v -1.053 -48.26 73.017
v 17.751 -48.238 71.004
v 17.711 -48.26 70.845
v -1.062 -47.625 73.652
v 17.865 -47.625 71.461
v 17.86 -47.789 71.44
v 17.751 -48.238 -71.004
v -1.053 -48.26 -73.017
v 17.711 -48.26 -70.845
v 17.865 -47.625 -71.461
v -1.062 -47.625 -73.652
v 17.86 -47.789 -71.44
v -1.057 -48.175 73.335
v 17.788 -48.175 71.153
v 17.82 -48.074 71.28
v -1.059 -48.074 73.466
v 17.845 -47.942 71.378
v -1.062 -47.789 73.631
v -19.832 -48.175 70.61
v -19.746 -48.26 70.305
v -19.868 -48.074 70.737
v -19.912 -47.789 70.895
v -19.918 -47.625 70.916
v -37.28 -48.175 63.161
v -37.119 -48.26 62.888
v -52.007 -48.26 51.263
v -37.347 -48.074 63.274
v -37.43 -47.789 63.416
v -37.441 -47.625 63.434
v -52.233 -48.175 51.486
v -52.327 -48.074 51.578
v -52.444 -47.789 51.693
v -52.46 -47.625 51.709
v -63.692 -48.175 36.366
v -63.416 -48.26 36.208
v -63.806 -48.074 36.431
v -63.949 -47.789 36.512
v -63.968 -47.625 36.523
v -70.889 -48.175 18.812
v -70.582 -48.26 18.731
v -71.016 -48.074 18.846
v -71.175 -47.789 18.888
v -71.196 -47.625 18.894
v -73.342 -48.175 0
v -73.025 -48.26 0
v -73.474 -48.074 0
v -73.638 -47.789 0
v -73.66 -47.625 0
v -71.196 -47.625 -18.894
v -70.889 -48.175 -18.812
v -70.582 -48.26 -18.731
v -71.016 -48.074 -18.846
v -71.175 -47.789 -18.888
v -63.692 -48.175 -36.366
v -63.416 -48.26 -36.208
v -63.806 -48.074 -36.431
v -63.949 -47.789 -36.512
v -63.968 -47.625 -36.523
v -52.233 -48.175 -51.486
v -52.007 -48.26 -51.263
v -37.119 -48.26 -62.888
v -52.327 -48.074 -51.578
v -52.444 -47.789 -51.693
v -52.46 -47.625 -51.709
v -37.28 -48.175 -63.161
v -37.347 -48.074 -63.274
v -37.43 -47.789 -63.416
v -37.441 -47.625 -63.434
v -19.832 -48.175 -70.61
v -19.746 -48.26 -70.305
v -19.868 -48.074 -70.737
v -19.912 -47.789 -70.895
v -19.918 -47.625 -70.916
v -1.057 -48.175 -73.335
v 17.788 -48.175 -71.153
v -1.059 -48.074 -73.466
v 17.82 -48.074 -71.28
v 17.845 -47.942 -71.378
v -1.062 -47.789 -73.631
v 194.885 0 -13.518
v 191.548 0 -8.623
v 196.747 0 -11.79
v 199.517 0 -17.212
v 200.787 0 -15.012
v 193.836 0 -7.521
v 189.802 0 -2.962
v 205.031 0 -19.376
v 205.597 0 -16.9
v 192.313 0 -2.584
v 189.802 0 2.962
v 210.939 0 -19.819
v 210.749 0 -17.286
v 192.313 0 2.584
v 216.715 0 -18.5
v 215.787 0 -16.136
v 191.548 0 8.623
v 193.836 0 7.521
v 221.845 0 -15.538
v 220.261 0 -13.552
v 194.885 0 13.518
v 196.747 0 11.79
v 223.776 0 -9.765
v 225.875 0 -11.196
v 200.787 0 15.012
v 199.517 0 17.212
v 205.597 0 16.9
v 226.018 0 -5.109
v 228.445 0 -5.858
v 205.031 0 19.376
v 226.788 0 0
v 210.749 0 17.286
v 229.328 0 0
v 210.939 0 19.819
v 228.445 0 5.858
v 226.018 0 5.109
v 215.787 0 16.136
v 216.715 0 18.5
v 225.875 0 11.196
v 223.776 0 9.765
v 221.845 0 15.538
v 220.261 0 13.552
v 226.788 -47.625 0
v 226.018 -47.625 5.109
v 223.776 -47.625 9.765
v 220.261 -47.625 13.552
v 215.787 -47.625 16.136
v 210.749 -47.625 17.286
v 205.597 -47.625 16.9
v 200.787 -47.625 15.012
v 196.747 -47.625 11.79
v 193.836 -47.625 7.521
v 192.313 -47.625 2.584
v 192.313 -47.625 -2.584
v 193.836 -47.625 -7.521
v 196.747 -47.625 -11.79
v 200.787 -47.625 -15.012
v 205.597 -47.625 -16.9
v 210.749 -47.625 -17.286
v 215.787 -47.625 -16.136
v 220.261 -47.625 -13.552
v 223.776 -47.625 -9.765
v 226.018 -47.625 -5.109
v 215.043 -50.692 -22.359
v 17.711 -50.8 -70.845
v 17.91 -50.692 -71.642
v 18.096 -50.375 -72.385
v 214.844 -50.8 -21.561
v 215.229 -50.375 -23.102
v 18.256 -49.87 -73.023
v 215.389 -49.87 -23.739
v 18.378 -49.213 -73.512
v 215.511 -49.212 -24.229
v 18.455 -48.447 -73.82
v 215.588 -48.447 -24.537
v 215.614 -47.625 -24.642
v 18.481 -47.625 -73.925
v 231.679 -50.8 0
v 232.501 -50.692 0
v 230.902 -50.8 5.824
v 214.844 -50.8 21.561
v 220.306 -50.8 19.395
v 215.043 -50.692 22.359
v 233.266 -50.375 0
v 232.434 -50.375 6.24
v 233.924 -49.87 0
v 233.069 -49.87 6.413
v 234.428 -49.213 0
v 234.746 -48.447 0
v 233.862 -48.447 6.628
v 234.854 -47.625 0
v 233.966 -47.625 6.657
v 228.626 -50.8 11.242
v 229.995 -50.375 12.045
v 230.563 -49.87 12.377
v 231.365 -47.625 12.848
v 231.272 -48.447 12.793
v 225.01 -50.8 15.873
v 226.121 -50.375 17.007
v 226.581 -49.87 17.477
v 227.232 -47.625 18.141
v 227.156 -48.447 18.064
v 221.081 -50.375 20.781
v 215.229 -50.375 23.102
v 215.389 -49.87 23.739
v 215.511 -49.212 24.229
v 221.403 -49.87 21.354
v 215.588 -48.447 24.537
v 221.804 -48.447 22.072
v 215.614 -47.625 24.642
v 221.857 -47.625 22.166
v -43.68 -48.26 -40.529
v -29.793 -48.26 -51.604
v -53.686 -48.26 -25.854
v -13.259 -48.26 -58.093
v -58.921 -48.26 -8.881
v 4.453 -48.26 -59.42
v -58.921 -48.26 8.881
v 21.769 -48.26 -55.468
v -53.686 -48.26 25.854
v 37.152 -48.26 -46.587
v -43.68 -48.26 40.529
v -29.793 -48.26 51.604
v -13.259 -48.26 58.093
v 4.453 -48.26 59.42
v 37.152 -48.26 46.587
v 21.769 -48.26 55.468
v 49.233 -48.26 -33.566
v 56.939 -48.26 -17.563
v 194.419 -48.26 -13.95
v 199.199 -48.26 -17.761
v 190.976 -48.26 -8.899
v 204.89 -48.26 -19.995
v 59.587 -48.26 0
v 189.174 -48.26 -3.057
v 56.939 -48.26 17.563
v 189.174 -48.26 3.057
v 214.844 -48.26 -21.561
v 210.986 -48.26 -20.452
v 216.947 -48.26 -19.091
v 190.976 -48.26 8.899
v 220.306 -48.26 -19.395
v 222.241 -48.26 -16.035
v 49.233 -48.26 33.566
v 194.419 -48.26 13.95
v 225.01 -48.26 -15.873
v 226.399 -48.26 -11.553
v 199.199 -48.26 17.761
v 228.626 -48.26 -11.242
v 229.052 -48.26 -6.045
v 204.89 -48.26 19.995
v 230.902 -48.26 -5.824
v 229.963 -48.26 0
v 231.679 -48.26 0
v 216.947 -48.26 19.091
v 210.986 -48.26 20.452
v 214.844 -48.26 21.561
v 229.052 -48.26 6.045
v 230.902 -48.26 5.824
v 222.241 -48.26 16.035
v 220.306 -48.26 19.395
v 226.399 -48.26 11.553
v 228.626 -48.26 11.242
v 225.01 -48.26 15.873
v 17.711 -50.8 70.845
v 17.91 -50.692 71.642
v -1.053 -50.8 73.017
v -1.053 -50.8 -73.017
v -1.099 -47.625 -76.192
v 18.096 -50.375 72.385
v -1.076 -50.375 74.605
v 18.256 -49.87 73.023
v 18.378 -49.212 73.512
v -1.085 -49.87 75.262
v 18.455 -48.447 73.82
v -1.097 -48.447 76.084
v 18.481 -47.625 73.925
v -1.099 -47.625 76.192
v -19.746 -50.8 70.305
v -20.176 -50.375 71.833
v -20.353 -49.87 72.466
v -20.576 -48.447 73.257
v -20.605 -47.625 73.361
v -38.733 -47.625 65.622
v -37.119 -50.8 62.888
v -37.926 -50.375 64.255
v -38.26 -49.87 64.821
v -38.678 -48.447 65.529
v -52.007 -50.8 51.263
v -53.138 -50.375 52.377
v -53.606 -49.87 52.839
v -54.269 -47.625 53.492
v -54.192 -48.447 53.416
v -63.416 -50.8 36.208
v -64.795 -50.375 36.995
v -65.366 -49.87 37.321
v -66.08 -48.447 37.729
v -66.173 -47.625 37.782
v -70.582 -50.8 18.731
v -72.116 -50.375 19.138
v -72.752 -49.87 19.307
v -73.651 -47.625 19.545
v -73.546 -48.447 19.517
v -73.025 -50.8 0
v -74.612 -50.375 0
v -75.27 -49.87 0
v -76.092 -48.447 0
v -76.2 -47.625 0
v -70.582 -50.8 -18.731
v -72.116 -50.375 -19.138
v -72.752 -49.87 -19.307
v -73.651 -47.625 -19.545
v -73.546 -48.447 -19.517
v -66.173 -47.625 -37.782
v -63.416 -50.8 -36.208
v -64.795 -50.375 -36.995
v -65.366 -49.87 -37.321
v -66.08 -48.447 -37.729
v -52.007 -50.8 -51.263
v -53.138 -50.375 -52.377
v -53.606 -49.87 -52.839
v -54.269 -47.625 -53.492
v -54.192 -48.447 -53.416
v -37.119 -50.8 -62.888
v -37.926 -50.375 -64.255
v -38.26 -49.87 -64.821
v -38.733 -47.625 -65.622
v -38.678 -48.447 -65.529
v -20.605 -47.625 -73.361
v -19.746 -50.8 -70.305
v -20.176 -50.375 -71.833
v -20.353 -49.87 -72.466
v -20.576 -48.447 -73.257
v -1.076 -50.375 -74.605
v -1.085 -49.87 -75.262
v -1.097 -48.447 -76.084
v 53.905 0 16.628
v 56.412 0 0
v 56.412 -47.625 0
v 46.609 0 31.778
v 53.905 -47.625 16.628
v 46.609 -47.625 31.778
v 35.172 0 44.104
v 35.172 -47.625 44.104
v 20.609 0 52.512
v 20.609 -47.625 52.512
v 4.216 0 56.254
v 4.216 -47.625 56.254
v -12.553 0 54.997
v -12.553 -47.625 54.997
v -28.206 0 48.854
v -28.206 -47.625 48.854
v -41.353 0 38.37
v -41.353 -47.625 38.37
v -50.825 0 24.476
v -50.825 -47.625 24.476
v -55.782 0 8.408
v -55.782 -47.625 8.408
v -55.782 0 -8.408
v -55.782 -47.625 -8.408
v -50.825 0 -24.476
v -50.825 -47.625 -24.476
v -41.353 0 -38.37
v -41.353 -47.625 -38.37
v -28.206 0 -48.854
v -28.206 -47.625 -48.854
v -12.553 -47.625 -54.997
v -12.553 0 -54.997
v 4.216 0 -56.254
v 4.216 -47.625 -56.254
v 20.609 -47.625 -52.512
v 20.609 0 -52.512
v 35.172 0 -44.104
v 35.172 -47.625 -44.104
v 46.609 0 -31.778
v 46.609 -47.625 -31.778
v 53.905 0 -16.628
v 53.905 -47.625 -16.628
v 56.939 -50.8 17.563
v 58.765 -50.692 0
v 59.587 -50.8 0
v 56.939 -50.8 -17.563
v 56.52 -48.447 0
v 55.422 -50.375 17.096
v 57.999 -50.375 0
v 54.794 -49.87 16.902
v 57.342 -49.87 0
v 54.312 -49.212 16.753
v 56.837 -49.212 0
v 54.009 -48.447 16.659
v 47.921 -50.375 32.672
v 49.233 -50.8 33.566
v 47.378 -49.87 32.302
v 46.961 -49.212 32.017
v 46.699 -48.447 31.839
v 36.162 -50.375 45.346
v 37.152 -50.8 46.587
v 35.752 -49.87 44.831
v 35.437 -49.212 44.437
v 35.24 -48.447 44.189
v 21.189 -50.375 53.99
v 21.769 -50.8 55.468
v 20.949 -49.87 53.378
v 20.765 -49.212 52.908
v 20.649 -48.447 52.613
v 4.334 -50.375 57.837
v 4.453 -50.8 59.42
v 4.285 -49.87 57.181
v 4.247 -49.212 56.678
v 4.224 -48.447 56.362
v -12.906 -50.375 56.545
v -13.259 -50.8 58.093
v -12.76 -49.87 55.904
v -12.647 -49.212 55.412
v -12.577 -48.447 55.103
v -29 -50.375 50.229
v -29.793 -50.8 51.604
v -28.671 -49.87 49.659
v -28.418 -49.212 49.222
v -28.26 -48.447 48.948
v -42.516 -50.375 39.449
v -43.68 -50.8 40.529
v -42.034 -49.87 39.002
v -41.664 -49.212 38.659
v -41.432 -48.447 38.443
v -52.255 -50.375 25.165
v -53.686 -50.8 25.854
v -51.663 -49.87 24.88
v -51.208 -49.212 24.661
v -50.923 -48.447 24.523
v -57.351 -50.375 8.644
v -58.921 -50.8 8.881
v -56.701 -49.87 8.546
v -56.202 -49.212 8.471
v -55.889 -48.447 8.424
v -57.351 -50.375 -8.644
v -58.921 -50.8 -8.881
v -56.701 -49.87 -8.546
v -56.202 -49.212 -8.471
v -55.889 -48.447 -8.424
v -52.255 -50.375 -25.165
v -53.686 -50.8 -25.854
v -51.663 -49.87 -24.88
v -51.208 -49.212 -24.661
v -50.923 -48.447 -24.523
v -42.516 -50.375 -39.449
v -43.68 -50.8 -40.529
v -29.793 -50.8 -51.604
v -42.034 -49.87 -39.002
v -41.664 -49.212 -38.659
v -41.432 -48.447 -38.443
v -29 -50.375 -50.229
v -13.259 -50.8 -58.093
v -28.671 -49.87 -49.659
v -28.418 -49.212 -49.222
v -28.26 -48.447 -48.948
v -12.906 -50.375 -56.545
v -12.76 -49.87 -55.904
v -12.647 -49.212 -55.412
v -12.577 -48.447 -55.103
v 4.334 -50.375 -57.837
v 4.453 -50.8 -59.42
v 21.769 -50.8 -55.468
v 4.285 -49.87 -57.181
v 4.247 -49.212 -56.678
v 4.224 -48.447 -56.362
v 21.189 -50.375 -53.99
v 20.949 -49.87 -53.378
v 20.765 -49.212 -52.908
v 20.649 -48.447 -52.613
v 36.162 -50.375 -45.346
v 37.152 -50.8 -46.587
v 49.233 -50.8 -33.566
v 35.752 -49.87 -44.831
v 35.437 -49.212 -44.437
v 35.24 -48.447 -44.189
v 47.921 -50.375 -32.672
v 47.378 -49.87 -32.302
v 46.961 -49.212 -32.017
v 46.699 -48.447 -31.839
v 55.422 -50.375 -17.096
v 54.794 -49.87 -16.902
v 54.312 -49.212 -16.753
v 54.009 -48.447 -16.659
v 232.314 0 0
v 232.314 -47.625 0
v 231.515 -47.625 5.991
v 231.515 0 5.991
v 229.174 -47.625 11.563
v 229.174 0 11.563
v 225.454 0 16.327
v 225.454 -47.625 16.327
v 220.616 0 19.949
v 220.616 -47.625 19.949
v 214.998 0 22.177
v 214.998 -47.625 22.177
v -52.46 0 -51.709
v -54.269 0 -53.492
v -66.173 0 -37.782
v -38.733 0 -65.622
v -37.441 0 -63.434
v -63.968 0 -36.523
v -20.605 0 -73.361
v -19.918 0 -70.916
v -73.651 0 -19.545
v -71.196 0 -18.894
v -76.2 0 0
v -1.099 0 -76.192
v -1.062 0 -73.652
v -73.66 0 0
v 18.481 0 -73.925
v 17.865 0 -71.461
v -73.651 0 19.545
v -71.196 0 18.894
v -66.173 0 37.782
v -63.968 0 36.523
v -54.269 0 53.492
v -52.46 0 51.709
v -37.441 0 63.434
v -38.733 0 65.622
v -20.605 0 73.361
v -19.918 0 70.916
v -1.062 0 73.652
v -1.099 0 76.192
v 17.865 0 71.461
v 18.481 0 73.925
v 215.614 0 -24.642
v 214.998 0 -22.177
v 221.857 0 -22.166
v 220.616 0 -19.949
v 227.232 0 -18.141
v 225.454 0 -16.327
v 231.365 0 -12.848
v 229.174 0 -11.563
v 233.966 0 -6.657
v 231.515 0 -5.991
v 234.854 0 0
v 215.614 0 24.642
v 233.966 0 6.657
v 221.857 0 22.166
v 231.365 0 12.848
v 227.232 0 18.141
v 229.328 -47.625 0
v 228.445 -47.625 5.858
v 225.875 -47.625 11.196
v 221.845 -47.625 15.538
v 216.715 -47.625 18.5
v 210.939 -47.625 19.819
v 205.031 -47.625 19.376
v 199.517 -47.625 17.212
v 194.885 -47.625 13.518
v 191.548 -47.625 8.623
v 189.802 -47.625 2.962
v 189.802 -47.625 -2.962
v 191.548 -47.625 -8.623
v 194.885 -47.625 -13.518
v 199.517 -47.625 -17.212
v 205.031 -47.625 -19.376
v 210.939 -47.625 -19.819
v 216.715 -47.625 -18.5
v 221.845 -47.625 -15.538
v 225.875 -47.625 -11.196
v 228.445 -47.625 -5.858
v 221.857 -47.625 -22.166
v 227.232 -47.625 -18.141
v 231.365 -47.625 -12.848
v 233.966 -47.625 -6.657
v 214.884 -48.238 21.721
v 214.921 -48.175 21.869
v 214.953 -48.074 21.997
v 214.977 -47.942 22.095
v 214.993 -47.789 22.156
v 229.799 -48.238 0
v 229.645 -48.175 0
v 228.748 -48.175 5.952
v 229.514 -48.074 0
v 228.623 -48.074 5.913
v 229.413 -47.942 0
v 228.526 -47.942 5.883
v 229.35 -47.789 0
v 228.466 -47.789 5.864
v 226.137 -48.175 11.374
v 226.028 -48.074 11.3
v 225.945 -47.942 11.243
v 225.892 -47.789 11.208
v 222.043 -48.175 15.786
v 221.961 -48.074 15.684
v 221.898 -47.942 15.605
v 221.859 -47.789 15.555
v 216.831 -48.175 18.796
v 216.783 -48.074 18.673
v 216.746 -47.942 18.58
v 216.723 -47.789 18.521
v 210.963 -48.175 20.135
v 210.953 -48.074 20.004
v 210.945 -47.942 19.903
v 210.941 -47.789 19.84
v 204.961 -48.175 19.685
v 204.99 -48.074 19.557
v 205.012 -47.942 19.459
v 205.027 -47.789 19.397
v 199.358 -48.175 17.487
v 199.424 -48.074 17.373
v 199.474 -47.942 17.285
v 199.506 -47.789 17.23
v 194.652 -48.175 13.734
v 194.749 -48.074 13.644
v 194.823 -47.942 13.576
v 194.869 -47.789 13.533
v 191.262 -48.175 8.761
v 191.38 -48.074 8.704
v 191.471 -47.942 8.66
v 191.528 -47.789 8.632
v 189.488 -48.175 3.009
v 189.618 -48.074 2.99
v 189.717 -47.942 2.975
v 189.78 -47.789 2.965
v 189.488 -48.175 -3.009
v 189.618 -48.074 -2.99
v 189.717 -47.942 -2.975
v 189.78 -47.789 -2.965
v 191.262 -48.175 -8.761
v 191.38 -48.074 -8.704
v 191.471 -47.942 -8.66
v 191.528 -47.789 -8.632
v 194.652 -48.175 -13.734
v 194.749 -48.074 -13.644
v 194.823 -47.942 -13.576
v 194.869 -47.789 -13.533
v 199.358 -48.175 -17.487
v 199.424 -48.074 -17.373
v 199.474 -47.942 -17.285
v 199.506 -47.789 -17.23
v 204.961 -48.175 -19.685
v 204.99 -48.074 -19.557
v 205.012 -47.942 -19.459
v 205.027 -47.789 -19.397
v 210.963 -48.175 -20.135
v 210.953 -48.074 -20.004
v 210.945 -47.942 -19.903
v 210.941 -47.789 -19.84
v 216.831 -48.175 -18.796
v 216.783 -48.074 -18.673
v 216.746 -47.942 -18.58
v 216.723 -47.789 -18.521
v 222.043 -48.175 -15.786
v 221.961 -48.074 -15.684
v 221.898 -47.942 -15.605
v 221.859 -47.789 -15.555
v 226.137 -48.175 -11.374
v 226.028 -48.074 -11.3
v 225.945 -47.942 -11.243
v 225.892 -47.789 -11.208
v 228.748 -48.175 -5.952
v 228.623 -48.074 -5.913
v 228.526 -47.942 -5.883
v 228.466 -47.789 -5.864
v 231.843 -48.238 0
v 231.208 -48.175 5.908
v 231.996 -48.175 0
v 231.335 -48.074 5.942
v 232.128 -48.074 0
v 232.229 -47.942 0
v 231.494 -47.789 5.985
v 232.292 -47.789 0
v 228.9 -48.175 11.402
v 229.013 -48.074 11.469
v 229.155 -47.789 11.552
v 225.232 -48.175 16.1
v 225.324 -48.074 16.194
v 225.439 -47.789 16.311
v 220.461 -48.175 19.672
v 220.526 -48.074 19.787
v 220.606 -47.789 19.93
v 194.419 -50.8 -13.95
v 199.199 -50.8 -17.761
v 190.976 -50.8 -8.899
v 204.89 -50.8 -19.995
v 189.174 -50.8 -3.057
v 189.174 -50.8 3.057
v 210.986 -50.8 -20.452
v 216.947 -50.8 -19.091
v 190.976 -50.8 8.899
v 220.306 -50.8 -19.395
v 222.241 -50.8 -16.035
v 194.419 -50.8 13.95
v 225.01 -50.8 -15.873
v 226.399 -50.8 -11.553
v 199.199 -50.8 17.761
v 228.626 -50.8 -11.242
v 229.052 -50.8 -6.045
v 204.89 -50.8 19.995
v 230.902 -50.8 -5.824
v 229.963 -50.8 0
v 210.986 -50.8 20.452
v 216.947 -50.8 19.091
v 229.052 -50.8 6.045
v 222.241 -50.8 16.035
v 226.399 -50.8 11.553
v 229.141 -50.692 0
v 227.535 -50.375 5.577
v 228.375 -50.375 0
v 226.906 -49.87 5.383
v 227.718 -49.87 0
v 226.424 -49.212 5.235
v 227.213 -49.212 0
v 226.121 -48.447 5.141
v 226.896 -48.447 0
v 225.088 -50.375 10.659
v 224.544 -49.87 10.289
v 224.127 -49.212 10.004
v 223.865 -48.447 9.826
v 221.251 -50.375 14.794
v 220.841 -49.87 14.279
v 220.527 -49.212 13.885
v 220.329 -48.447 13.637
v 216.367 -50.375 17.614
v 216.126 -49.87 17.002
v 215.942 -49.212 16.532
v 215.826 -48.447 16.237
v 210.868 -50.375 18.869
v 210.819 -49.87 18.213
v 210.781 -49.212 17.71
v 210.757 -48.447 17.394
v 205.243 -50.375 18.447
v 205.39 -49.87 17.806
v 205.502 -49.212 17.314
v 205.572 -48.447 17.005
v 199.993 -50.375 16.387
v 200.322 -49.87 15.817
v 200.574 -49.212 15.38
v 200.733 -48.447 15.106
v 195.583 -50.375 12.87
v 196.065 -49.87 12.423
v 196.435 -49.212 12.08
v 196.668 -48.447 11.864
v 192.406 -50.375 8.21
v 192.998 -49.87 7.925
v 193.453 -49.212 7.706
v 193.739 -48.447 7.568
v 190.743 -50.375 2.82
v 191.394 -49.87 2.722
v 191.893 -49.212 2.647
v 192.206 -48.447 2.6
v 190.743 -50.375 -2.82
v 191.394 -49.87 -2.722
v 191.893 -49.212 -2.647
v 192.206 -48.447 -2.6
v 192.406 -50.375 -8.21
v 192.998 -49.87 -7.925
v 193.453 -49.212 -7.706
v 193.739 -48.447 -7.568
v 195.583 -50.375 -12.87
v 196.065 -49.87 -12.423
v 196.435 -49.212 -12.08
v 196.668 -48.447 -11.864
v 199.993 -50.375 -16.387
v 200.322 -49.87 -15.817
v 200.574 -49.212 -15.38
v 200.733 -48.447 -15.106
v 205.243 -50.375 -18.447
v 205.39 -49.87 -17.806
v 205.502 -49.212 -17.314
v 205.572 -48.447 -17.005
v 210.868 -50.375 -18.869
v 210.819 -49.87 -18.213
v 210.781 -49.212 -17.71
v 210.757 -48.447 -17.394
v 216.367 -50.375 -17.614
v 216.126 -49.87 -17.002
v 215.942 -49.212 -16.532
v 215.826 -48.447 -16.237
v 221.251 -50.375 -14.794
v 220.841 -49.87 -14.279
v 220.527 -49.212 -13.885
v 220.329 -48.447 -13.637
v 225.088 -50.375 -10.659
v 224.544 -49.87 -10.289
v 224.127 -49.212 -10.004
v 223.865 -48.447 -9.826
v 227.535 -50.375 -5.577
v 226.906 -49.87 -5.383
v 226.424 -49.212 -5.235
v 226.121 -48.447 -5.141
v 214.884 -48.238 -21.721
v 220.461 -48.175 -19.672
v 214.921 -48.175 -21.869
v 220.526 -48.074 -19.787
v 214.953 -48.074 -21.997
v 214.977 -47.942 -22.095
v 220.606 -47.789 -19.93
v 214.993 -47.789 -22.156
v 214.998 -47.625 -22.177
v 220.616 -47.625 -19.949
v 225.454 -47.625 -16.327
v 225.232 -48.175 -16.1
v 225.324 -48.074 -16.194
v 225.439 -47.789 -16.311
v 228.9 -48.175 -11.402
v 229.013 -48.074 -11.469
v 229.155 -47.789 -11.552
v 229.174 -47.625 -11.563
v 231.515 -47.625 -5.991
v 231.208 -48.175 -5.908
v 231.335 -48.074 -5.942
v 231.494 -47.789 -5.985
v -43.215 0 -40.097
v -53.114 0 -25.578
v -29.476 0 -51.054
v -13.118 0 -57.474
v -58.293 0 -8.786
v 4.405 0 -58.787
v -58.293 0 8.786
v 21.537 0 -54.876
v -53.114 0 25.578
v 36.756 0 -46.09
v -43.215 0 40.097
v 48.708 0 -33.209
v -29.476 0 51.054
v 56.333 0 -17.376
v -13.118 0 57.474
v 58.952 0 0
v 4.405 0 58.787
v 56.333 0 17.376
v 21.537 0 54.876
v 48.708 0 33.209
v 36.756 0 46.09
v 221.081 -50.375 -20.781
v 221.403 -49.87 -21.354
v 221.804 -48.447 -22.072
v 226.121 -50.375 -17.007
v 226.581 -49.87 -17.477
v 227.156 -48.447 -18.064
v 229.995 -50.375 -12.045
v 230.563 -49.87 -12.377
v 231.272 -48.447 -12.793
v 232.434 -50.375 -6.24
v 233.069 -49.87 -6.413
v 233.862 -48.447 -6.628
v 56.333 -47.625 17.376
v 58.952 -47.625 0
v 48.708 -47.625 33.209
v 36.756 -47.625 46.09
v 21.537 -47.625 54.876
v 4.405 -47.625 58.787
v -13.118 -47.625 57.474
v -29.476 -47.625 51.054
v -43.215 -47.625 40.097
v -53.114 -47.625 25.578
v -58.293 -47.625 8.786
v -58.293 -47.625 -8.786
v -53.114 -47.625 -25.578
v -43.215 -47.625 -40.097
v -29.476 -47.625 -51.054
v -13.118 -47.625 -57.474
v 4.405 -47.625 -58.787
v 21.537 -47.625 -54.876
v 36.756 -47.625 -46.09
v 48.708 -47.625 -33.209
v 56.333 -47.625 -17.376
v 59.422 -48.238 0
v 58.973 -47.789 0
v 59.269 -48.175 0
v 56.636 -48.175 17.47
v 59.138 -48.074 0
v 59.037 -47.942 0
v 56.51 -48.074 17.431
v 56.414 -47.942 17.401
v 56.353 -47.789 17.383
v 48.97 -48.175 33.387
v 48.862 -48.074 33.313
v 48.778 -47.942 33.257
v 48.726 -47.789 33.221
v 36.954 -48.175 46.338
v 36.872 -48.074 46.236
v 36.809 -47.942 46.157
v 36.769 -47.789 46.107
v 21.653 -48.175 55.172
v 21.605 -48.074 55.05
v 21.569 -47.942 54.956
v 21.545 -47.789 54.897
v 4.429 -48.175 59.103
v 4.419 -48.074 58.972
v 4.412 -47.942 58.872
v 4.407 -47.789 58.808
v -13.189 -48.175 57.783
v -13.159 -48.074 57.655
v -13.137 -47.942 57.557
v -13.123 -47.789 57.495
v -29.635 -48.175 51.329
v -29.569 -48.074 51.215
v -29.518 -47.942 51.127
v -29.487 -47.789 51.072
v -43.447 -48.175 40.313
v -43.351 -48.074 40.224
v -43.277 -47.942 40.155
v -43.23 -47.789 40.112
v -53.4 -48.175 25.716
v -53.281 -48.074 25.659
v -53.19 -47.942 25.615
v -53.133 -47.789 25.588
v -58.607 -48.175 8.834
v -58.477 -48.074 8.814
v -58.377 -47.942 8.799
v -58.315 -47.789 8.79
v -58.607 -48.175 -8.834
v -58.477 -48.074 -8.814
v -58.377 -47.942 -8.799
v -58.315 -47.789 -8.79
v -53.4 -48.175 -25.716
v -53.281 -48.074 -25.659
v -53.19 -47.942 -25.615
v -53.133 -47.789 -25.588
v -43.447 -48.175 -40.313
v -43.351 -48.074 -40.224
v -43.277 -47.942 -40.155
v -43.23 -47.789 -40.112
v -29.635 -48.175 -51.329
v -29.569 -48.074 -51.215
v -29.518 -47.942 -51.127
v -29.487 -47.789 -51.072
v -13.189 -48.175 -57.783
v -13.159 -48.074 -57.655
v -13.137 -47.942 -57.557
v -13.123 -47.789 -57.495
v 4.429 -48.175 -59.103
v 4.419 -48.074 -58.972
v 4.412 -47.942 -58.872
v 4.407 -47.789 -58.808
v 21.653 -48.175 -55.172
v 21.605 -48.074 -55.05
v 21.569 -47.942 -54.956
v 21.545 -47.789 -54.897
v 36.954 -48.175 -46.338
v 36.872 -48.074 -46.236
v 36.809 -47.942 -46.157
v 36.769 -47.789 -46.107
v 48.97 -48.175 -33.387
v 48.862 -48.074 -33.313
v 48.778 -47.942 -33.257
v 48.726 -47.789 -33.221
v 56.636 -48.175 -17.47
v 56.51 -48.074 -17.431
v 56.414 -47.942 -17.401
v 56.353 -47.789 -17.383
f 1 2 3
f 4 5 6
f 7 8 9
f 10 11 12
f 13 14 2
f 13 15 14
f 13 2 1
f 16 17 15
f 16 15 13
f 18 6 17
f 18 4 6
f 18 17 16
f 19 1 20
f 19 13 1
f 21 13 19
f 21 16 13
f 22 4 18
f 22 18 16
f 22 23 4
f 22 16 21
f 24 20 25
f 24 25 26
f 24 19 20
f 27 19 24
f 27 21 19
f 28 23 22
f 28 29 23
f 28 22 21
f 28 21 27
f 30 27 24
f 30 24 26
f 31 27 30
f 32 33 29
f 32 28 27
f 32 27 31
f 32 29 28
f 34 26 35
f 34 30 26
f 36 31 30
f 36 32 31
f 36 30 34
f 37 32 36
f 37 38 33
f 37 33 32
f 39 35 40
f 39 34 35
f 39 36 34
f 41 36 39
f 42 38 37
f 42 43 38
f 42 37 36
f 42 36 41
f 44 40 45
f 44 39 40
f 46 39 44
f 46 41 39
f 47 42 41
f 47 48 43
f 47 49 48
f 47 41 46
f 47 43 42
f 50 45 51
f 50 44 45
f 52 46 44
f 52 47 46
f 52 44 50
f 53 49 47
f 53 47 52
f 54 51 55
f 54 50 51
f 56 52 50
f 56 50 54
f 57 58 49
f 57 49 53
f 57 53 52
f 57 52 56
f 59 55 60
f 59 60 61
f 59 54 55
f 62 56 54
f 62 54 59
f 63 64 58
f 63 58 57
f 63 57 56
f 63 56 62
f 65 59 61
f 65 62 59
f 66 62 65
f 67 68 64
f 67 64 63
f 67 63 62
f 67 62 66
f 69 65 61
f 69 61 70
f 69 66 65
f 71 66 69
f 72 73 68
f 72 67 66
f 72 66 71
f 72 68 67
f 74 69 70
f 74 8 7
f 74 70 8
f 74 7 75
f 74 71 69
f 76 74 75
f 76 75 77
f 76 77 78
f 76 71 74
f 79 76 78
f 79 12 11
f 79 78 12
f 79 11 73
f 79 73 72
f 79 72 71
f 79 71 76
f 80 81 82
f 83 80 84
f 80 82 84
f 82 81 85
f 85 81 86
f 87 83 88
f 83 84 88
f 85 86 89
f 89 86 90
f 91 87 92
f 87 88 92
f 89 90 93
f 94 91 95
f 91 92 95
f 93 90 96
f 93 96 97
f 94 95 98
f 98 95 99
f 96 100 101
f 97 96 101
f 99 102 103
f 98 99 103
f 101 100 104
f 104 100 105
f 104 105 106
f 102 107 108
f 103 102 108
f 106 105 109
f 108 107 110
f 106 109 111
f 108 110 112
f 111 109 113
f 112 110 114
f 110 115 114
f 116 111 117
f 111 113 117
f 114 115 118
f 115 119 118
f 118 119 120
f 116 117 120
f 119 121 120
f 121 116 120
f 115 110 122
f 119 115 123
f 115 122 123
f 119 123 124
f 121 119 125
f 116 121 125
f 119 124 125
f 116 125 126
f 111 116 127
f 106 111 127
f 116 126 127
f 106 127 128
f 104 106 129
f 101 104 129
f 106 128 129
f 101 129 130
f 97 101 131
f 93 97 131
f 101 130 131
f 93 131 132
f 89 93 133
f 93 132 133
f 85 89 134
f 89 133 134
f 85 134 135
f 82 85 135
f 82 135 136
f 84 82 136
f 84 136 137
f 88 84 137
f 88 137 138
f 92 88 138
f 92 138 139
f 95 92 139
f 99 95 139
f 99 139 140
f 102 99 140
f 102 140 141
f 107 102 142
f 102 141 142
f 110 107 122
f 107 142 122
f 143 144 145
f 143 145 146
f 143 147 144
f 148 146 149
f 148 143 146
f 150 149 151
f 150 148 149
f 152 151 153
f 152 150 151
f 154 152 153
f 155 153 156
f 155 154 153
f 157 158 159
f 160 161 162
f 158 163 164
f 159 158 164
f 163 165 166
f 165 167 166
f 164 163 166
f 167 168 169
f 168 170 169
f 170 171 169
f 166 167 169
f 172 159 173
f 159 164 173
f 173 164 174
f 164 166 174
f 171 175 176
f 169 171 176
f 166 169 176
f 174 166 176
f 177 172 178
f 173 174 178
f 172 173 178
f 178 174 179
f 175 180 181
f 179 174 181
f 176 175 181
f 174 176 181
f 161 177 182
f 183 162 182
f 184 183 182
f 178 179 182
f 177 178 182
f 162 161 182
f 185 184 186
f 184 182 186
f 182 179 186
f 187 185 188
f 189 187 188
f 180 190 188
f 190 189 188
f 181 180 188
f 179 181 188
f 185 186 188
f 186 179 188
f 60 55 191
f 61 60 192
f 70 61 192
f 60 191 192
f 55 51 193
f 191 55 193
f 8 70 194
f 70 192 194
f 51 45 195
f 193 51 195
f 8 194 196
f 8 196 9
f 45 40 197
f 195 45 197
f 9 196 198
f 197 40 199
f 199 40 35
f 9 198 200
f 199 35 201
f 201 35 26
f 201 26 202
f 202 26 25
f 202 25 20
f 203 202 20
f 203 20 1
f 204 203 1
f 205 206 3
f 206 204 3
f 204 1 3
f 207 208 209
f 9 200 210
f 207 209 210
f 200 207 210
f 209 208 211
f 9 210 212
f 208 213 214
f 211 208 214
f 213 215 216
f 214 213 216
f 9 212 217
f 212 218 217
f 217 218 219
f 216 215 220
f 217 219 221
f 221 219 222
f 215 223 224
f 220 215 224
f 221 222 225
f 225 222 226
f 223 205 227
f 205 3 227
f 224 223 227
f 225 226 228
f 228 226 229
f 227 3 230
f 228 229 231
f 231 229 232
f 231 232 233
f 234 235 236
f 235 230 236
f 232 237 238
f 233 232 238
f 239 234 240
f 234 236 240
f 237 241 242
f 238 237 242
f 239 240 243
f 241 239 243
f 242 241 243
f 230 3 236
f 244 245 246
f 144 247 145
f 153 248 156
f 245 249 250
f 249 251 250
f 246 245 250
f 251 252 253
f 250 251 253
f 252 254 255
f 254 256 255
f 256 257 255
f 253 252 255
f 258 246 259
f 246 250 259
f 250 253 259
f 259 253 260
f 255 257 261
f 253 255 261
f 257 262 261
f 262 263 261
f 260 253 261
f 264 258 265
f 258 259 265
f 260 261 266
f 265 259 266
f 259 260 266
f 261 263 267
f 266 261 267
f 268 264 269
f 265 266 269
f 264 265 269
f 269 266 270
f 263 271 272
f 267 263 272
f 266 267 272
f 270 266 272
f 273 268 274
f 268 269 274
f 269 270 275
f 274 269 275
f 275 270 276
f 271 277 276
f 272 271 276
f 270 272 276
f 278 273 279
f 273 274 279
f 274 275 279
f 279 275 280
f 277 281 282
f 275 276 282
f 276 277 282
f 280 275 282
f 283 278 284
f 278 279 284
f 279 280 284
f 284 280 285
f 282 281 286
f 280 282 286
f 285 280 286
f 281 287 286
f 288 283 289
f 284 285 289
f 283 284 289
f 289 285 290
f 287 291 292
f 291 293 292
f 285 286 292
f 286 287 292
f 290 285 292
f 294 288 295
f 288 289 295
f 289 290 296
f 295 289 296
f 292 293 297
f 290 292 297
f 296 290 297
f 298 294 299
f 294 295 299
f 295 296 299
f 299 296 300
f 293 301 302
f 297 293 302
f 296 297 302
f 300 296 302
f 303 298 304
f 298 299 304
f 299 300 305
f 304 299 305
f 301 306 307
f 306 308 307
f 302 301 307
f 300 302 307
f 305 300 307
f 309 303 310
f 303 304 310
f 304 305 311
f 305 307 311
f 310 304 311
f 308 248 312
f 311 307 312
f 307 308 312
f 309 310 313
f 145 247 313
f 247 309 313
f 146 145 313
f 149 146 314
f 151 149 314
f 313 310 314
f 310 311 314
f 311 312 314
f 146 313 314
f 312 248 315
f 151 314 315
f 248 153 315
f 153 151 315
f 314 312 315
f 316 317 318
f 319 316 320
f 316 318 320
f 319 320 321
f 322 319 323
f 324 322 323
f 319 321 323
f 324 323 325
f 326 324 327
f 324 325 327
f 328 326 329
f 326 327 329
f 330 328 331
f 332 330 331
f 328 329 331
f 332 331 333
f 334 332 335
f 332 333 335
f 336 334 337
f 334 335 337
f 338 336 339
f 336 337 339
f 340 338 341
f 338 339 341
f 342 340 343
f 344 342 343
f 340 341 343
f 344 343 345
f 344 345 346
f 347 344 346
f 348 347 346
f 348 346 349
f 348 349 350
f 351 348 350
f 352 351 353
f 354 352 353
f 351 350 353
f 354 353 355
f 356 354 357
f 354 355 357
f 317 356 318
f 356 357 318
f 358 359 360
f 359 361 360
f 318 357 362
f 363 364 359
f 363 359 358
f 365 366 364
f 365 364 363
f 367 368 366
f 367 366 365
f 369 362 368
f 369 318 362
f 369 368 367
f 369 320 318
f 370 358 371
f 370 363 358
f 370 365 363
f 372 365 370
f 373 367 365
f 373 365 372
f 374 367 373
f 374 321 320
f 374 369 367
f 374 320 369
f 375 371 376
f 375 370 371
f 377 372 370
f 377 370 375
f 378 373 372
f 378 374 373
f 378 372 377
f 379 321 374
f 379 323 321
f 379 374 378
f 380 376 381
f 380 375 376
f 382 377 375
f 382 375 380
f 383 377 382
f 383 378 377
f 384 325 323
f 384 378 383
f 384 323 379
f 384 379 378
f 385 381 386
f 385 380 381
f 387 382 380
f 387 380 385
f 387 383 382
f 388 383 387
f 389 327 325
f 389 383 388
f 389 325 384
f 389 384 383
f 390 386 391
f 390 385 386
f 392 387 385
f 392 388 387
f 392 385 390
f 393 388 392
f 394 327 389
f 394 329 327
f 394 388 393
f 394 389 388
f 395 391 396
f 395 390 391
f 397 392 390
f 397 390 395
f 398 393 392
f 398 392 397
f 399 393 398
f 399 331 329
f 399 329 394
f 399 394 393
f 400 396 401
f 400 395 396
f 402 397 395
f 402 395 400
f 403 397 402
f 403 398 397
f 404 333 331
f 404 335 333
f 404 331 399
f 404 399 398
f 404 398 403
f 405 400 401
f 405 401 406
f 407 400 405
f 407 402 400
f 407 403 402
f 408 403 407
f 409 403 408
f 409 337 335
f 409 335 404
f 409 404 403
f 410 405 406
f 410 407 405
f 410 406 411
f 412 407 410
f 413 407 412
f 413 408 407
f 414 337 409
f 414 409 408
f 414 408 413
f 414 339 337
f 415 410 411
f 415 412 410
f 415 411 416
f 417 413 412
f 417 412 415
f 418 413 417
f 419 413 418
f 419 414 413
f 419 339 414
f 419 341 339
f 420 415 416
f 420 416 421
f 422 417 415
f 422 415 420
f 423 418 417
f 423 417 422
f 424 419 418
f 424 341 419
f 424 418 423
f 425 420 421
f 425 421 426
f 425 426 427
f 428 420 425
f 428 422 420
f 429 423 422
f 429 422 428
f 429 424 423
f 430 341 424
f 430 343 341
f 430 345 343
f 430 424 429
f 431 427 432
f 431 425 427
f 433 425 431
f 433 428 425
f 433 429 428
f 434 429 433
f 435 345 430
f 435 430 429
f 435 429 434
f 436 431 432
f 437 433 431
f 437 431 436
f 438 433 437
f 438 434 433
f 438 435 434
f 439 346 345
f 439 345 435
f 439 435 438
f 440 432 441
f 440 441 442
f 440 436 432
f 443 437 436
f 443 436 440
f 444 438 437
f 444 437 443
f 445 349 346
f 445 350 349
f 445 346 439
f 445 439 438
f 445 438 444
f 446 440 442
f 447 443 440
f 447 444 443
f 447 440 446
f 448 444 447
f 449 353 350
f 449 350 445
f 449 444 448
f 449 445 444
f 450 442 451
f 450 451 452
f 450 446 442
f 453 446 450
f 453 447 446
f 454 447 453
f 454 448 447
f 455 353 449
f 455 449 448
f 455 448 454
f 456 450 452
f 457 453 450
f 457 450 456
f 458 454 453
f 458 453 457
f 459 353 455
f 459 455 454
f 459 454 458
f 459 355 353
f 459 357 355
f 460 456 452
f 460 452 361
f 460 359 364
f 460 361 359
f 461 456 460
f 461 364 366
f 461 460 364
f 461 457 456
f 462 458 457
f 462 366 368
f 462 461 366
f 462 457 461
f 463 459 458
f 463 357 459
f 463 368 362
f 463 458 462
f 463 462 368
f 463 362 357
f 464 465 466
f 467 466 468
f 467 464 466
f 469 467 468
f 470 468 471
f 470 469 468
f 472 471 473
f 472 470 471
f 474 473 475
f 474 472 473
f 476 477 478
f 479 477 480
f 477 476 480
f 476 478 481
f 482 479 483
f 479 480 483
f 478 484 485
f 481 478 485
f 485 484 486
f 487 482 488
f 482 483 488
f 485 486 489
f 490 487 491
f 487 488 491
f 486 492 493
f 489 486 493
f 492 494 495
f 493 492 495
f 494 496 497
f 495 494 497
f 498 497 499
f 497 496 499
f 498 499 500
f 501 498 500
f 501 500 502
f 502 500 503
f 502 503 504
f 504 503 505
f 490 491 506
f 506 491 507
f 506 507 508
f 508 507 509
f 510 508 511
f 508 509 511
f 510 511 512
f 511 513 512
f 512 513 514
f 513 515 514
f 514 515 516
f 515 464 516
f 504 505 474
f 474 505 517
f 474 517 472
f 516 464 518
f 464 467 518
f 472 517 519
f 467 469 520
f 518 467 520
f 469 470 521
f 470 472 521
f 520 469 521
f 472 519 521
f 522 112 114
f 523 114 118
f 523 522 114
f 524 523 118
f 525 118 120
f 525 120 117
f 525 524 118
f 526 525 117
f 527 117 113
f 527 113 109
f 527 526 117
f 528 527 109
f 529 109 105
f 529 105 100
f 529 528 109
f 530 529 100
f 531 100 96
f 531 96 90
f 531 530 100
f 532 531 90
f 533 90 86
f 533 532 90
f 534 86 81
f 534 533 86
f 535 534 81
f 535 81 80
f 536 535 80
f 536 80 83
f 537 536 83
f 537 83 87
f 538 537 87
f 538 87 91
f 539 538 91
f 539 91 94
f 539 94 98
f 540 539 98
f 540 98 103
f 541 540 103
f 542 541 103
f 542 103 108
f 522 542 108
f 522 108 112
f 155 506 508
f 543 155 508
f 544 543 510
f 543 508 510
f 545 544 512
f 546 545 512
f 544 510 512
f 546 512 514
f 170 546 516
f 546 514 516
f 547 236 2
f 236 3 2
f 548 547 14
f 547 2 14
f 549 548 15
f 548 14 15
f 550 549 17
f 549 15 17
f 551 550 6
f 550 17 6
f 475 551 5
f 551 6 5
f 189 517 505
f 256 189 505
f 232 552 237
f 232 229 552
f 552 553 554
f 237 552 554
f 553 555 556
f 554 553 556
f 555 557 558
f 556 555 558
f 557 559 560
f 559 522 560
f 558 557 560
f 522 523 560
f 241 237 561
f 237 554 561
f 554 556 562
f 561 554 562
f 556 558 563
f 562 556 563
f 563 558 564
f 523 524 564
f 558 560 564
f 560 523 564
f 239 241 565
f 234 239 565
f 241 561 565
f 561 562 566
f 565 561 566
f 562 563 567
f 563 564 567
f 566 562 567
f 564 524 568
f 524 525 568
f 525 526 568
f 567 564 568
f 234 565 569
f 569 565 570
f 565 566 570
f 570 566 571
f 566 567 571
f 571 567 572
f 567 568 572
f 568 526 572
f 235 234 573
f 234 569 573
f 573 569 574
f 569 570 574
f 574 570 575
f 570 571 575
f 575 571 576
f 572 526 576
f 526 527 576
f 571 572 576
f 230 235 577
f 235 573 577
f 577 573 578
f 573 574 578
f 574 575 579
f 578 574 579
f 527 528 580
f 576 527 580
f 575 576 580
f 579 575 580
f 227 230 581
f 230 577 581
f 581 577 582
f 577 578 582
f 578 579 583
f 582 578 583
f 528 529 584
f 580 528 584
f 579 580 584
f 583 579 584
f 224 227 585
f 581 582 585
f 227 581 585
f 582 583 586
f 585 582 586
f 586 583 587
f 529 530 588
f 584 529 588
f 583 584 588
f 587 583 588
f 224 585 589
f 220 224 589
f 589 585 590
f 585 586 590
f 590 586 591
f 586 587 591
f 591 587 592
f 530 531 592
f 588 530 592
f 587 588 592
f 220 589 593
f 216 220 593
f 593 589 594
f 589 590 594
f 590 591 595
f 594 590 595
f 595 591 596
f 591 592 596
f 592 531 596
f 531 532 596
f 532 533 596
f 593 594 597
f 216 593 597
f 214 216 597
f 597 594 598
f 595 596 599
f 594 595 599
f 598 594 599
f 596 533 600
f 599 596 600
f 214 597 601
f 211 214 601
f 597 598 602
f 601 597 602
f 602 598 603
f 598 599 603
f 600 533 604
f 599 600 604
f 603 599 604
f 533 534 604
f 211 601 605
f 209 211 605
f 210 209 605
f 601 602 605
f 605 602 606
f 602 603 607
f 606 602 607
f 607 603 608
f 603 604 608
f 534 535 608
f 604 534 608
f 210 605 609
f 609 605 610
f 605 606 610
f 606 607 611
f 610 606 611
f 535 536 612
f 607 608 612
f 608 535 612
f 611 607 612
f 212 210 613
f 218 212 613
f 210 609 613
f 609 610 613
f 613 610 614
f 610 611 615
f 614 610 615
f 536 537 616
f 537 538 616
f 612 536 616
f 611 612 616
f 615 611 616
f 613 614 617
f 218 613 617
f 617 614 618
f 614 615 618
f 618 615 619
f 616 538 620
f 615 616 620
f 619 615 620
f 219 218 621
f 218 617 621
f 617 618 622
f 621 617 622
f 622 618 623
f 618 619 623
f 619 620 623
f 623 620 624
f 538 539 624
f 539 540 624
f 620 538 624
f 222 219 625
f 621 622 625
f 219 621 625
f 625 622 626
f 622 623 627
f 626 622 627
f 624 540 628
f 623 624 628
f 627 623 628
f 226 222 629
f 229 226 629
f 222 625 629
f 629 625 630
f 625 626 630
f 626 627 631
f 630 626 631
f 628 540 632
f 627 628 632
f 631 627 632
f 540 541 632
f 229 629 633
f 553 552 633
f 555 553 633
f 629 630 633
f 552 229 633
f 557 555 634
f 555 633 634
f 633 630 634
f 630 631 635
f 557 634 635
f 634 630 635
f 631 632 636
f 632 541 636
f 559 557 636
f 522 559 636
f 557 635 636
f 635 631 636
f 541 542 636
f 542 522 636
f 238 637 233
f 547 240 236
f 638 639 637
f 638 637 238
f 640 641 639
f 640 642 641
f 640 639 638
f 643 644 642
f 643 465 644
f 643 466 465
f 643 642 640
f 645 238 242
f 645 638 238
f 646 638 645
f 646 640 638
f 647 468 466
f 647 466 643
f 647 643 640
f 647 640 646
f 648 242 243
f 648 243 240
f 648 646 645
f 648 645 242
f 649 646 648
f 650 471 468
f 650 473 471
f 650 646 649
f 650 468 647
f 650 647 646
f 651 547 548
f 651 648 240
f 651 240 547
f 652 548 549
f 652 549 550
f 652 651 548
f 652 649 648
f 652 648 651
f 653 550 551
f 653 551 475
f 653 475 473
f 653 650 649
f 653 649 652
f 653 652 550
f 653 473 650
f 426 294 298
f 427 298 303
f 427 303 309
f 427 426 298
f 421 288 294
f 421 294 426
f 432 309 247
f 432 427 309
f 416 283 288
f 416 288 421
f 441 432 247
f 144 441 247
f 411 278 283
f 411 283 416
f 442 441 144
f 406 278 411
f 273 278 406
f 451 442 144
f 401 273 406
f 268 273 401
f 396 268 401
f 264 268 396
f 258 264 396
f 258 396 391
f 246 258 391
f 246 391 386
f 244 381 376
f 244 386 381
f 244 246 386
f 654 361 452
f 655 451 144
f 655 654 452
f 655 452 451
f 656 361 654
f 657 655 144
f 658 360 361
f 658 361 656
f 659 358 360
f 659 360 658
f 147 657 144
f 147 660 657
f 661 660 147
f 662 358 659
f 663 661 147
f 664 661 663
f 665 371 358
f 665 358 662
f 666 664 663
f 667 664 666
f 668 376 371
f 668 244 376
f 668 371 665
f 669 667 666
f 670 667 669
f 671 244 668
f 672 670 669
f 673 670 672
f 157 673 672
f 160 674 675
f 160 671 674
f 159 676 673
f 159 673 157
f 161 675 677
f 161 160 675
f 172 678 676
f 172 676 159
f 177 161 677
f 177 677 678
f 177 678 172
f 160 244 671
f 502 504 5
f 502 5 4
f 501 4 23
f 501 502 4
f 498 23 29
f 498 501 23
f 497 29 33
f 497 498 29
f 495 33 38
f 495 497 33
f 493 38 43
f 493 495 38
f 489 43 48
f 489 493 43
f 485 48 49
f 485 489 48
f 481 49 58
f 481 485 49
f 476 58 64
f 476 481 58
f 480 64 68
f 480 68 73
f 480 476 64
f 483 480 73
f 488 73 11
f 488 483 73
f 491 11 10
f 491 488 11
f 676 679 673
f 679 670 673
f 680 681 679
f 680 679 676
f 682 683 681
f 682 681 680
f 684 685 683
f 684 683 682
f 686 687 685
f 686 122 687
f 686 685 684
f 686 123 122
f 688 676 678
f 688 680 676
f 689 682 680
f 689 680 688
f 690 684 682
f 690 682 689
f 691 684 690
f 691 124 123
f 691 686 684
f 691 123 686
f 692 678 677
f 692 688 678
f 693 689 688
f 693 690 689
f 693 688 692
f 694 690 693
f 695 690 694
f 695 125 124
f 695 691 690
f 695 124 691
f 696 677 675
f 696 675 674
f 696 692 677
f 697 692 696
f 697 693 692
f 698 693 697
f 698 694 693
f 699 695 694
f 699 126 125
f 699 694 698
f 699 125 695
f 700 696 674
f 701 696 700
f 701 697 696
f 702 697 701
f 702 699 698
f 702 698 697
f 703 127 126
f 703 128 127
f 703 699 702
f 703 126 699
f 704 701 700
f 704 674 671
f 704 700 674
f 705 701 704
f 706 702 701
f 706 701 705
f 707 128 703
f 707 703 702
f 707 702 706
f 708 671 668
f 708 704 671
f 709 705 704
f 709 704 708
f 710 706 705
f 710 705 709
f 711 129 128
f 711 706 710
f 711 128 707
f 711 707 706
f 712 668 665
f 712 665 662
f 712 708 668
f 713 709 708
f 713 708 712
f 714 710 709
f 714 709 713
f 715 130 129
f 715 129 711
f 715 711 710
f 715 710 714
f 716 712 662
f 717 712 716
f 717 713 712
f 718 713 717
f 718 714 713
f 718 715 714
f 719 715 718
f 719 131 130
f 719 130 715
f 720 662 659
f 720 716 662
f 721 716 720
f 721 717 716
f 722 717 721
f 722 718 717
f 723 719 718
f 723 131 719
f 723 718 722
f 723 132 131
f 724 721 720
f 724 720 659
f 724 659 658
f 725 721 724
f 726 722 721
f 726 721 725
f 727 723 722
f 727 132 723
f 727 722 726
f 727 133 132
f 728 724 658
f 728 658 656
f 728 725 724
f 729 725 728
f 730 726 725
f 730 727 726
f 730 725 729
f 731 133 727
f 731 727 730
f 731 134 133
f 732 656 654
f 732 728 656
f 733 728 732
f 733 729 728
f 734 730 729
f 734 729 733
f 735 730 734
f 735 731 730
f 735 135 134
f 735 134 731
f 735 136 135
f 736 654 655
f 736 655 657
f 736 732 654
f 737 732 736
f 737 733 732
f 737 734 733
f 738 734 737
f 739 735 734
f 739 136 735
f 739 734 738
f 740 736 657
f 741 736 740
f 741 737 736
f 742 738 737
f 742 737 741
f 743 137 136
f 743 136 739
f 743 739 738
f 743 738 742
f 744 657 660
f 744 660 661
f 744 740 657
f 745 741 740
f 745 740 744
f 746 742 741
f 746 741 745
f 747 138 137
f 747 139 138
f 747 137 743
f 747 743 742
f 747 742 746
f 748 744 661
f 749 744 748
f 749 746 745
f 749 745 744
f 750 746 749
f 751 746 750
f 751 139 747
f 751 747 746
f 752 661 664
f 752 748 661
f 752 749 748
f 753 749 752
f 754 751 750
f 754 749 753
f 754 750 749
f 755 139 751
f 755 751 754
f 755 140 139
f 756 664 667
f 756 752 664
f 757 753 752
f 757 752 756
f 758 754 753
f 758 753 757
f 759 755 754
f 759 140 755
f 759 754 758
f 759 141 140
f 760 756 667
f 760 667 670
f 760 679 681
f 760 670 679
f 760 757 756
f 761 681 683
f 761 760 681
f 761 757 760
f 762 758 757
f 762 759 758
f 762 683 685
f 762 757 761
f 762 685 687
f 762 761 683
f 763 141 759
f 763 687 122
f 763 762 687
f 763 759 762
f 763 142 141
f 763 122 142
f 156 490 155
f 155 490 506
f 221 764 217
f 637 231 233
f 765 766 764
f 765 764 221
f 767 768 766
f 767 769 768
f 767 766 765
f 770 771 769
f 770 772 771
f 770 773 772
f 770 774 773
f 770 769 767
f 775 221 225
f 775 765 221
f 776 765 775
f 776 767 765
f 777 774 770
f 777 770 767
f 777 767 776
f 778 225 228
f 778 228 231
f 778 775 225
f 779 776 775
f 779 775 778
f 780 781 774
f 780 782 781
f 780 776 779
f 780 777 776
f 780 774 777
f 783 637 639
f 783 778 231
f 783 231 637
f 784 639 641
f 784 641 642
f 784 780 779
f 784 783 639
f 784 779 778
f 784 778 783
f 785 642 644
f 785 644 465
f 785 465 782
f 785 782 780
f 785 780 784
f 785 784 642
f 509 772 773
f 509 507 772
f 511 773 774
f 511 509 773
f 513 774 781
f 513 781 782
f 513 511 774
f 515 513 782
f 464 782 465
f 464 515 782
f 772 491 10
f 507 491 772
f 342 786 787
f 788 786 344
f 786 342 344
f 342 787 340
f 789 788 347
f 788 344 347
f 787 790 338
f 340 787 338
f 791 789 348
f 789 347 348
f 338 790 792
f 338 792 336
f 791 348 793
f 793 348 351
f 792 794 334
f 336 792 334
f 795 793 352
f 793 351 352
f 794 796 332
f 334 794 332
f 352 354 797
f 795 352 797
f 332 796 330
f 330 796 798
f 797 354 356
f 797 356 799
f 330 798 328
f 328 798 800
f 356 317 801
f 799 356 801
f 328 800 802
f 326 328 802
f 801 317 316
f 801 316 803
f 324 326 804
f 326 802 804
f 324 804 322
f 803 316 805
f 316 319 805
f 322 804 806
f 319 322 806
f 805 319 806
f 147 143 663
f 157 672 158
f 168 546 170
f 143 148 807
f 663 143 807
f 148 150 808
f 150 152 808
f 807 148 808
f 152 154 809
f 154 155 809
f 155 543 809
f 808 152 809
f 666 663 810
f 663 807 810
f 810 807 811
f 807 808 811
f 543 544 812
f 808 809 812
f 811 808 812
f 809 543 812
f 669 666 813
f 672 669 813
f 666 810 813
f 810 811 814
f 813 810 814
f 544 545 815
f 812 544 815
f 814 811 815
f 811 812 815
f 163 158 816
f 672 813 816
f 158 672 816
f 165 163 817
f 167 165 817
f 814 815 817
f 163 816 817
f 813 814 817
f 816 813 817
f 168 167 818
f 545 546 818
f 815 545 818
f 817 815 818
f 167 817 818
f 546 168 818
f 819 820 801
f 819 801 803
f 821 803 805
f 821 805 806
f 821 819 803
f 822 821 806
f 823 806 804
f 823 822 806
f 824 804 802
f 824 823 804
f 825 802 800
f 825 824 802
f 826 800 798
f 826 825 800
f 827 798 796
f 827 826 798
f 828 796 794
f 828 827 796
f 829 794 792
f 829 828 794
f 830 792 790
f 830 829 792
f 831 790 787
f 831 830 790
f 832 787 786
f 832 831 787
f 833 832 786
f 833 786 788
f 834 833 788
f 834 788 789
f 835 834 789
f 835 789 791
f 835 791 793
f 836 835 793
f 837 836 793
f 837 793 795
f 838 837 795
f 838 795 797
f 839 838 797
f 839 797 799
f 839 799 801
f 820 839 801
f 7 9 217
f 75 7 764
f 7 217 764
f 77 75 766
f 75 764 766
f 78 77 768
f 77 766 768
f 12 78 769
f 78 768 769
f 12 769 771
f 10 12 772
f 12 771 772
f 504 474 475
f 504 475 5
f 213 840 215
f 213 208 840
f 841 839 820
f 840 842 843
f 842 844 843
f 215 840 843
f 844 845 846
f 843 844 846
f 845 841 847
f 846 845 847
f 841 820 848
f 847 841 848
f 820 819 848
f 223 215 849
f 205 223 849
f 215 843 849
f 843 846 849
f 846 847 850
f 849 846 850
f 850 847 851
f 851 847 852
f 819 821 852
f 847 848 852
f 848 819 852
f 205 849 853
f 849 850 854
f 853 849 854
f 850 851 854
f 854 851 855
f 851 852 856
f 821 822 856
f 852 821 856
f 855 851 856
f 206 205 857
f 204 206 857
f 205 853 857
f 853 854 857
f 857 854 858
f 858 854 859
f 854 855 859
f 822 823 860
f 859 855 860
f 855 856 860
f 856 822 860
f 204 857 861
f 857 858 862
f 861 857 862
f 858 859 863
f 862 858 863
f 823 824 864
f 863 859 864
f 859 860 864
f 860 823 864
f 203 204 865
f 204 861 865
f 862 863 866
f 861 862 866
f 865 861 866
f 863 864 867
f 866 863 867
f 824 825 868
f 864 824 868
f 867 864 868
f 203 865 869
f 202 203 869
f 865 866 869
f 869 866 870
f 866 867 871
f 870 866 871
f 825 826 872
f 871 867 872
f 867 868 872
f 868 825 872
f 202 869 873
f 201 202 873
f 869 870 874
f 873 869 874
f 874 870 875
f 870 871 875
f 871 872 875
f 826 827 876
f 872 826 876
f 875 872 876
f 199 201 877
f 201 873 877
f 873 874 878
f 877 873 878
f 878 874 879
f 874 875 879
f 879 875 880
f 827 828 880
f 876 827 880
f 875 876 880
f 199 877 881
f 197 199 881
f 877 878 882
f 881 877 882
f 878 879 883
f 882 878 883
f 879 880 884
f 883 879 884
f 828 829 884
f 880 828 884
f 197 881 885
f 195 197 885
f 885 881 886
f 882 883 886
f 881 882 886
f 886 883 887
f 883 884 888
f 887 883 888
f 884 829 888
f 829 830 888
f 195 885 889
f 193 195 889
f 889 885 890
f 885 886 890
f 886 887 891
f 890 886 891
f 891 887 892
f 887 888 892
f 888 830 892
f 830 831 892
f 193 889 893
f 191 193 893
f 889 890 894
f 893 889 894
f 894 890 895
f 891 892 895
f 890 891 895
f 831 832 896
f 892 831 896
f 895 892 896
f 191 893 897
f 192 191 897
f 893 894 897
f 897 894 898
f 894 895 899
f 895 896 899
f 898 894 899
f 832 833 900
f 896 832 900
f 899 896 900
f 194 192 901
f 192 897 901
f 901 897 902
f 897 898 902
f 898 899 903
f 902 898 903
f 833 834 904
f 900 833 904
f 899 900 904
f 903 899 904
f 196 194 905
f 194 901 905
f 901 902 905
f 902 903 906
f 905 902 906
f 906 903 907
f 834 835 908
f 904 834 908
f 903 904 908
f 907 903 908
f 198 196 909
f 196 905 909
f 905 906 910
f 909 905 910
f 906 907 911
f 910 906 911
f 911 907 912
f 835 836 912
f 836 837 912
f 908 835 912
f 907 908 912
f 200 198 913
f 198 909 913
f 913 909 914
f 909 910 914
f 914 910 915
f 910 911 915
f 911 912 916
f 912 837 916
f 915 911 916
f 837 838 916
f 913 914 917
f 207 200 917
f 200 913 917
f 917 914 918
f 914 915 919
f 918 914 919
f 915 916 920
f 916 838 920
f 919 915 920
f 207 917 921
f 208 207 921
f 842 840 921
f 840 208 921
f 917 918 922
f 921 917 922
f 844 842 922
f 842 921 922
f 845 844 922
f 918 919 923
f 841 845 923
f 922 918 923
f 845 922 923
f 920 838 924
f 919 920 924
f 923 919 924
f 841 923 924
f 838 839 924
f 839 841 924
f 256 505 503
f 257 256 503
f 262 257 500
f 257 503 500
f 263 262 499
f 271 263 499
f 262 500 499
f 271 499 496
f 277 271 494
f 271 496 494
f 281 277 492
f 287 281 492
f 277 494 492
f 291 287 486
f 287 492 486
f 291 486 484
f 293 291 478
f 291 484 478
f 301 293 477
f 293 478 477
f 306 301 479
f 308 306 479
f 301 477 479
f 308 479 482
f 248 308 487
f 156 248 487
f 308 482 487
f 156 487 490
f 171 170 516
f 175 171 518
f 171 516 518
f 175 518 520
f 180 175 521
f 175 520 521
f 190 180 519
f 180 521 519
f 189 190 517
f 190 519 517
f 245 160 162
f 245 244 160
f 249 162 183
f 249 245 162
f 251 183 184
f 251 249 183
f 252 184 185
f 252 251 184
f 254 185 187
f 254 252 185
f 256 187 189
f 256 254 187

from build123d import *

# Parameters (mm, degrees)
F1_DEPTH = 50.8
F2_R     = 56.411599825
F2_R_2   = 17.3341868335
F3_DEPTH = 50.8
F4_R     = 3.175
F5_T     = -2.54


with BuildPart() as f1:
    # F0 (on Front) → F1 (new body)
    with BuildSketch(Plane.XZ):
        with BuildLine():
            ThreePointArc((18.4812146278, 73.9248585111), (60.0612543768, 46.8944103565), (76.2, 0))
            ThreePointArc((76.2, 0), (60.0612543768, -46.8944103565), (18.4812146278, -73.9248585111))
            Line((18.4812146278, -73.9248585111), (215.6141706573, -24.6416195037))
            ThreePointArc((215.6141706573, -24.6416195037), (184.0537657814, 0), (215.6141706573, 24.6416195037))
            Line((215.6141706573, 24.6416195037), (18.4812146278, 73.9248585111))
        make_face()
        with BuildLine():
            ThreePointArc((234.8537657814, 0), (229.474183907, 15.6314701188), (215.6141706573, 24.6416195037))
            ThreePointArc((215.6141706573, 24.6416195037), (184.0537657814, 0), (215.6141706573, -24.6416195037))
            ThreePointArc((215.6141706573, -24.6416195037), (229.474183907, -15.6314701188), (234.8537657814, 0))
        make_face()
        with BuildLine():
            ThreePointArc((18.4812146278, -73.9248585111), (60.0612543768, -46.8944103565), (76.2, 0))
            ThreePointArc((76.2, 0), (60.0612543768, 46.8944103565), (18.4812146278, 73.9248585111))
            ThreePointArc((18.4812146278, 73.9248585111), (-76.2, 0), (18.4812146278, -73.9248585111))
        make_face()
    extrude(amount=F1_DEPTH)

    # F2 (on face) → F3 (cut)
    with BuildSketch(Plane.XZ.offset(50.8)):
        Circle(F2_R)
        with Locations((209.4537657814, 0)):
            Circle(F2_R_2)
    extrude(amount=-F3_DEPTH, mode=Mode.SUBTRACT)

    # F4
    f4_edges = [f1.edges().sort_by_distance(p)[0] for p in [
        (117.047693, -50.8, 49.283239),
        (234.853766, -50.8, 0),
        (-76.2, -50.8, 0),
        (117.047693, -50.8, -49.283239),
        (-56.4116, -50.8, 0),
        (192.119579, -50.8, 0),
    ]]
    fillet(f4_edges, radius=F4_R)

    # F5
    f5_openings = [f1.faces().sort_by_distance(p)[0] for p in [
        (77.972977, 0, 0),
    ]]
    offset(amount=F5_T, openings=f5_openings)


solid = f1.part
